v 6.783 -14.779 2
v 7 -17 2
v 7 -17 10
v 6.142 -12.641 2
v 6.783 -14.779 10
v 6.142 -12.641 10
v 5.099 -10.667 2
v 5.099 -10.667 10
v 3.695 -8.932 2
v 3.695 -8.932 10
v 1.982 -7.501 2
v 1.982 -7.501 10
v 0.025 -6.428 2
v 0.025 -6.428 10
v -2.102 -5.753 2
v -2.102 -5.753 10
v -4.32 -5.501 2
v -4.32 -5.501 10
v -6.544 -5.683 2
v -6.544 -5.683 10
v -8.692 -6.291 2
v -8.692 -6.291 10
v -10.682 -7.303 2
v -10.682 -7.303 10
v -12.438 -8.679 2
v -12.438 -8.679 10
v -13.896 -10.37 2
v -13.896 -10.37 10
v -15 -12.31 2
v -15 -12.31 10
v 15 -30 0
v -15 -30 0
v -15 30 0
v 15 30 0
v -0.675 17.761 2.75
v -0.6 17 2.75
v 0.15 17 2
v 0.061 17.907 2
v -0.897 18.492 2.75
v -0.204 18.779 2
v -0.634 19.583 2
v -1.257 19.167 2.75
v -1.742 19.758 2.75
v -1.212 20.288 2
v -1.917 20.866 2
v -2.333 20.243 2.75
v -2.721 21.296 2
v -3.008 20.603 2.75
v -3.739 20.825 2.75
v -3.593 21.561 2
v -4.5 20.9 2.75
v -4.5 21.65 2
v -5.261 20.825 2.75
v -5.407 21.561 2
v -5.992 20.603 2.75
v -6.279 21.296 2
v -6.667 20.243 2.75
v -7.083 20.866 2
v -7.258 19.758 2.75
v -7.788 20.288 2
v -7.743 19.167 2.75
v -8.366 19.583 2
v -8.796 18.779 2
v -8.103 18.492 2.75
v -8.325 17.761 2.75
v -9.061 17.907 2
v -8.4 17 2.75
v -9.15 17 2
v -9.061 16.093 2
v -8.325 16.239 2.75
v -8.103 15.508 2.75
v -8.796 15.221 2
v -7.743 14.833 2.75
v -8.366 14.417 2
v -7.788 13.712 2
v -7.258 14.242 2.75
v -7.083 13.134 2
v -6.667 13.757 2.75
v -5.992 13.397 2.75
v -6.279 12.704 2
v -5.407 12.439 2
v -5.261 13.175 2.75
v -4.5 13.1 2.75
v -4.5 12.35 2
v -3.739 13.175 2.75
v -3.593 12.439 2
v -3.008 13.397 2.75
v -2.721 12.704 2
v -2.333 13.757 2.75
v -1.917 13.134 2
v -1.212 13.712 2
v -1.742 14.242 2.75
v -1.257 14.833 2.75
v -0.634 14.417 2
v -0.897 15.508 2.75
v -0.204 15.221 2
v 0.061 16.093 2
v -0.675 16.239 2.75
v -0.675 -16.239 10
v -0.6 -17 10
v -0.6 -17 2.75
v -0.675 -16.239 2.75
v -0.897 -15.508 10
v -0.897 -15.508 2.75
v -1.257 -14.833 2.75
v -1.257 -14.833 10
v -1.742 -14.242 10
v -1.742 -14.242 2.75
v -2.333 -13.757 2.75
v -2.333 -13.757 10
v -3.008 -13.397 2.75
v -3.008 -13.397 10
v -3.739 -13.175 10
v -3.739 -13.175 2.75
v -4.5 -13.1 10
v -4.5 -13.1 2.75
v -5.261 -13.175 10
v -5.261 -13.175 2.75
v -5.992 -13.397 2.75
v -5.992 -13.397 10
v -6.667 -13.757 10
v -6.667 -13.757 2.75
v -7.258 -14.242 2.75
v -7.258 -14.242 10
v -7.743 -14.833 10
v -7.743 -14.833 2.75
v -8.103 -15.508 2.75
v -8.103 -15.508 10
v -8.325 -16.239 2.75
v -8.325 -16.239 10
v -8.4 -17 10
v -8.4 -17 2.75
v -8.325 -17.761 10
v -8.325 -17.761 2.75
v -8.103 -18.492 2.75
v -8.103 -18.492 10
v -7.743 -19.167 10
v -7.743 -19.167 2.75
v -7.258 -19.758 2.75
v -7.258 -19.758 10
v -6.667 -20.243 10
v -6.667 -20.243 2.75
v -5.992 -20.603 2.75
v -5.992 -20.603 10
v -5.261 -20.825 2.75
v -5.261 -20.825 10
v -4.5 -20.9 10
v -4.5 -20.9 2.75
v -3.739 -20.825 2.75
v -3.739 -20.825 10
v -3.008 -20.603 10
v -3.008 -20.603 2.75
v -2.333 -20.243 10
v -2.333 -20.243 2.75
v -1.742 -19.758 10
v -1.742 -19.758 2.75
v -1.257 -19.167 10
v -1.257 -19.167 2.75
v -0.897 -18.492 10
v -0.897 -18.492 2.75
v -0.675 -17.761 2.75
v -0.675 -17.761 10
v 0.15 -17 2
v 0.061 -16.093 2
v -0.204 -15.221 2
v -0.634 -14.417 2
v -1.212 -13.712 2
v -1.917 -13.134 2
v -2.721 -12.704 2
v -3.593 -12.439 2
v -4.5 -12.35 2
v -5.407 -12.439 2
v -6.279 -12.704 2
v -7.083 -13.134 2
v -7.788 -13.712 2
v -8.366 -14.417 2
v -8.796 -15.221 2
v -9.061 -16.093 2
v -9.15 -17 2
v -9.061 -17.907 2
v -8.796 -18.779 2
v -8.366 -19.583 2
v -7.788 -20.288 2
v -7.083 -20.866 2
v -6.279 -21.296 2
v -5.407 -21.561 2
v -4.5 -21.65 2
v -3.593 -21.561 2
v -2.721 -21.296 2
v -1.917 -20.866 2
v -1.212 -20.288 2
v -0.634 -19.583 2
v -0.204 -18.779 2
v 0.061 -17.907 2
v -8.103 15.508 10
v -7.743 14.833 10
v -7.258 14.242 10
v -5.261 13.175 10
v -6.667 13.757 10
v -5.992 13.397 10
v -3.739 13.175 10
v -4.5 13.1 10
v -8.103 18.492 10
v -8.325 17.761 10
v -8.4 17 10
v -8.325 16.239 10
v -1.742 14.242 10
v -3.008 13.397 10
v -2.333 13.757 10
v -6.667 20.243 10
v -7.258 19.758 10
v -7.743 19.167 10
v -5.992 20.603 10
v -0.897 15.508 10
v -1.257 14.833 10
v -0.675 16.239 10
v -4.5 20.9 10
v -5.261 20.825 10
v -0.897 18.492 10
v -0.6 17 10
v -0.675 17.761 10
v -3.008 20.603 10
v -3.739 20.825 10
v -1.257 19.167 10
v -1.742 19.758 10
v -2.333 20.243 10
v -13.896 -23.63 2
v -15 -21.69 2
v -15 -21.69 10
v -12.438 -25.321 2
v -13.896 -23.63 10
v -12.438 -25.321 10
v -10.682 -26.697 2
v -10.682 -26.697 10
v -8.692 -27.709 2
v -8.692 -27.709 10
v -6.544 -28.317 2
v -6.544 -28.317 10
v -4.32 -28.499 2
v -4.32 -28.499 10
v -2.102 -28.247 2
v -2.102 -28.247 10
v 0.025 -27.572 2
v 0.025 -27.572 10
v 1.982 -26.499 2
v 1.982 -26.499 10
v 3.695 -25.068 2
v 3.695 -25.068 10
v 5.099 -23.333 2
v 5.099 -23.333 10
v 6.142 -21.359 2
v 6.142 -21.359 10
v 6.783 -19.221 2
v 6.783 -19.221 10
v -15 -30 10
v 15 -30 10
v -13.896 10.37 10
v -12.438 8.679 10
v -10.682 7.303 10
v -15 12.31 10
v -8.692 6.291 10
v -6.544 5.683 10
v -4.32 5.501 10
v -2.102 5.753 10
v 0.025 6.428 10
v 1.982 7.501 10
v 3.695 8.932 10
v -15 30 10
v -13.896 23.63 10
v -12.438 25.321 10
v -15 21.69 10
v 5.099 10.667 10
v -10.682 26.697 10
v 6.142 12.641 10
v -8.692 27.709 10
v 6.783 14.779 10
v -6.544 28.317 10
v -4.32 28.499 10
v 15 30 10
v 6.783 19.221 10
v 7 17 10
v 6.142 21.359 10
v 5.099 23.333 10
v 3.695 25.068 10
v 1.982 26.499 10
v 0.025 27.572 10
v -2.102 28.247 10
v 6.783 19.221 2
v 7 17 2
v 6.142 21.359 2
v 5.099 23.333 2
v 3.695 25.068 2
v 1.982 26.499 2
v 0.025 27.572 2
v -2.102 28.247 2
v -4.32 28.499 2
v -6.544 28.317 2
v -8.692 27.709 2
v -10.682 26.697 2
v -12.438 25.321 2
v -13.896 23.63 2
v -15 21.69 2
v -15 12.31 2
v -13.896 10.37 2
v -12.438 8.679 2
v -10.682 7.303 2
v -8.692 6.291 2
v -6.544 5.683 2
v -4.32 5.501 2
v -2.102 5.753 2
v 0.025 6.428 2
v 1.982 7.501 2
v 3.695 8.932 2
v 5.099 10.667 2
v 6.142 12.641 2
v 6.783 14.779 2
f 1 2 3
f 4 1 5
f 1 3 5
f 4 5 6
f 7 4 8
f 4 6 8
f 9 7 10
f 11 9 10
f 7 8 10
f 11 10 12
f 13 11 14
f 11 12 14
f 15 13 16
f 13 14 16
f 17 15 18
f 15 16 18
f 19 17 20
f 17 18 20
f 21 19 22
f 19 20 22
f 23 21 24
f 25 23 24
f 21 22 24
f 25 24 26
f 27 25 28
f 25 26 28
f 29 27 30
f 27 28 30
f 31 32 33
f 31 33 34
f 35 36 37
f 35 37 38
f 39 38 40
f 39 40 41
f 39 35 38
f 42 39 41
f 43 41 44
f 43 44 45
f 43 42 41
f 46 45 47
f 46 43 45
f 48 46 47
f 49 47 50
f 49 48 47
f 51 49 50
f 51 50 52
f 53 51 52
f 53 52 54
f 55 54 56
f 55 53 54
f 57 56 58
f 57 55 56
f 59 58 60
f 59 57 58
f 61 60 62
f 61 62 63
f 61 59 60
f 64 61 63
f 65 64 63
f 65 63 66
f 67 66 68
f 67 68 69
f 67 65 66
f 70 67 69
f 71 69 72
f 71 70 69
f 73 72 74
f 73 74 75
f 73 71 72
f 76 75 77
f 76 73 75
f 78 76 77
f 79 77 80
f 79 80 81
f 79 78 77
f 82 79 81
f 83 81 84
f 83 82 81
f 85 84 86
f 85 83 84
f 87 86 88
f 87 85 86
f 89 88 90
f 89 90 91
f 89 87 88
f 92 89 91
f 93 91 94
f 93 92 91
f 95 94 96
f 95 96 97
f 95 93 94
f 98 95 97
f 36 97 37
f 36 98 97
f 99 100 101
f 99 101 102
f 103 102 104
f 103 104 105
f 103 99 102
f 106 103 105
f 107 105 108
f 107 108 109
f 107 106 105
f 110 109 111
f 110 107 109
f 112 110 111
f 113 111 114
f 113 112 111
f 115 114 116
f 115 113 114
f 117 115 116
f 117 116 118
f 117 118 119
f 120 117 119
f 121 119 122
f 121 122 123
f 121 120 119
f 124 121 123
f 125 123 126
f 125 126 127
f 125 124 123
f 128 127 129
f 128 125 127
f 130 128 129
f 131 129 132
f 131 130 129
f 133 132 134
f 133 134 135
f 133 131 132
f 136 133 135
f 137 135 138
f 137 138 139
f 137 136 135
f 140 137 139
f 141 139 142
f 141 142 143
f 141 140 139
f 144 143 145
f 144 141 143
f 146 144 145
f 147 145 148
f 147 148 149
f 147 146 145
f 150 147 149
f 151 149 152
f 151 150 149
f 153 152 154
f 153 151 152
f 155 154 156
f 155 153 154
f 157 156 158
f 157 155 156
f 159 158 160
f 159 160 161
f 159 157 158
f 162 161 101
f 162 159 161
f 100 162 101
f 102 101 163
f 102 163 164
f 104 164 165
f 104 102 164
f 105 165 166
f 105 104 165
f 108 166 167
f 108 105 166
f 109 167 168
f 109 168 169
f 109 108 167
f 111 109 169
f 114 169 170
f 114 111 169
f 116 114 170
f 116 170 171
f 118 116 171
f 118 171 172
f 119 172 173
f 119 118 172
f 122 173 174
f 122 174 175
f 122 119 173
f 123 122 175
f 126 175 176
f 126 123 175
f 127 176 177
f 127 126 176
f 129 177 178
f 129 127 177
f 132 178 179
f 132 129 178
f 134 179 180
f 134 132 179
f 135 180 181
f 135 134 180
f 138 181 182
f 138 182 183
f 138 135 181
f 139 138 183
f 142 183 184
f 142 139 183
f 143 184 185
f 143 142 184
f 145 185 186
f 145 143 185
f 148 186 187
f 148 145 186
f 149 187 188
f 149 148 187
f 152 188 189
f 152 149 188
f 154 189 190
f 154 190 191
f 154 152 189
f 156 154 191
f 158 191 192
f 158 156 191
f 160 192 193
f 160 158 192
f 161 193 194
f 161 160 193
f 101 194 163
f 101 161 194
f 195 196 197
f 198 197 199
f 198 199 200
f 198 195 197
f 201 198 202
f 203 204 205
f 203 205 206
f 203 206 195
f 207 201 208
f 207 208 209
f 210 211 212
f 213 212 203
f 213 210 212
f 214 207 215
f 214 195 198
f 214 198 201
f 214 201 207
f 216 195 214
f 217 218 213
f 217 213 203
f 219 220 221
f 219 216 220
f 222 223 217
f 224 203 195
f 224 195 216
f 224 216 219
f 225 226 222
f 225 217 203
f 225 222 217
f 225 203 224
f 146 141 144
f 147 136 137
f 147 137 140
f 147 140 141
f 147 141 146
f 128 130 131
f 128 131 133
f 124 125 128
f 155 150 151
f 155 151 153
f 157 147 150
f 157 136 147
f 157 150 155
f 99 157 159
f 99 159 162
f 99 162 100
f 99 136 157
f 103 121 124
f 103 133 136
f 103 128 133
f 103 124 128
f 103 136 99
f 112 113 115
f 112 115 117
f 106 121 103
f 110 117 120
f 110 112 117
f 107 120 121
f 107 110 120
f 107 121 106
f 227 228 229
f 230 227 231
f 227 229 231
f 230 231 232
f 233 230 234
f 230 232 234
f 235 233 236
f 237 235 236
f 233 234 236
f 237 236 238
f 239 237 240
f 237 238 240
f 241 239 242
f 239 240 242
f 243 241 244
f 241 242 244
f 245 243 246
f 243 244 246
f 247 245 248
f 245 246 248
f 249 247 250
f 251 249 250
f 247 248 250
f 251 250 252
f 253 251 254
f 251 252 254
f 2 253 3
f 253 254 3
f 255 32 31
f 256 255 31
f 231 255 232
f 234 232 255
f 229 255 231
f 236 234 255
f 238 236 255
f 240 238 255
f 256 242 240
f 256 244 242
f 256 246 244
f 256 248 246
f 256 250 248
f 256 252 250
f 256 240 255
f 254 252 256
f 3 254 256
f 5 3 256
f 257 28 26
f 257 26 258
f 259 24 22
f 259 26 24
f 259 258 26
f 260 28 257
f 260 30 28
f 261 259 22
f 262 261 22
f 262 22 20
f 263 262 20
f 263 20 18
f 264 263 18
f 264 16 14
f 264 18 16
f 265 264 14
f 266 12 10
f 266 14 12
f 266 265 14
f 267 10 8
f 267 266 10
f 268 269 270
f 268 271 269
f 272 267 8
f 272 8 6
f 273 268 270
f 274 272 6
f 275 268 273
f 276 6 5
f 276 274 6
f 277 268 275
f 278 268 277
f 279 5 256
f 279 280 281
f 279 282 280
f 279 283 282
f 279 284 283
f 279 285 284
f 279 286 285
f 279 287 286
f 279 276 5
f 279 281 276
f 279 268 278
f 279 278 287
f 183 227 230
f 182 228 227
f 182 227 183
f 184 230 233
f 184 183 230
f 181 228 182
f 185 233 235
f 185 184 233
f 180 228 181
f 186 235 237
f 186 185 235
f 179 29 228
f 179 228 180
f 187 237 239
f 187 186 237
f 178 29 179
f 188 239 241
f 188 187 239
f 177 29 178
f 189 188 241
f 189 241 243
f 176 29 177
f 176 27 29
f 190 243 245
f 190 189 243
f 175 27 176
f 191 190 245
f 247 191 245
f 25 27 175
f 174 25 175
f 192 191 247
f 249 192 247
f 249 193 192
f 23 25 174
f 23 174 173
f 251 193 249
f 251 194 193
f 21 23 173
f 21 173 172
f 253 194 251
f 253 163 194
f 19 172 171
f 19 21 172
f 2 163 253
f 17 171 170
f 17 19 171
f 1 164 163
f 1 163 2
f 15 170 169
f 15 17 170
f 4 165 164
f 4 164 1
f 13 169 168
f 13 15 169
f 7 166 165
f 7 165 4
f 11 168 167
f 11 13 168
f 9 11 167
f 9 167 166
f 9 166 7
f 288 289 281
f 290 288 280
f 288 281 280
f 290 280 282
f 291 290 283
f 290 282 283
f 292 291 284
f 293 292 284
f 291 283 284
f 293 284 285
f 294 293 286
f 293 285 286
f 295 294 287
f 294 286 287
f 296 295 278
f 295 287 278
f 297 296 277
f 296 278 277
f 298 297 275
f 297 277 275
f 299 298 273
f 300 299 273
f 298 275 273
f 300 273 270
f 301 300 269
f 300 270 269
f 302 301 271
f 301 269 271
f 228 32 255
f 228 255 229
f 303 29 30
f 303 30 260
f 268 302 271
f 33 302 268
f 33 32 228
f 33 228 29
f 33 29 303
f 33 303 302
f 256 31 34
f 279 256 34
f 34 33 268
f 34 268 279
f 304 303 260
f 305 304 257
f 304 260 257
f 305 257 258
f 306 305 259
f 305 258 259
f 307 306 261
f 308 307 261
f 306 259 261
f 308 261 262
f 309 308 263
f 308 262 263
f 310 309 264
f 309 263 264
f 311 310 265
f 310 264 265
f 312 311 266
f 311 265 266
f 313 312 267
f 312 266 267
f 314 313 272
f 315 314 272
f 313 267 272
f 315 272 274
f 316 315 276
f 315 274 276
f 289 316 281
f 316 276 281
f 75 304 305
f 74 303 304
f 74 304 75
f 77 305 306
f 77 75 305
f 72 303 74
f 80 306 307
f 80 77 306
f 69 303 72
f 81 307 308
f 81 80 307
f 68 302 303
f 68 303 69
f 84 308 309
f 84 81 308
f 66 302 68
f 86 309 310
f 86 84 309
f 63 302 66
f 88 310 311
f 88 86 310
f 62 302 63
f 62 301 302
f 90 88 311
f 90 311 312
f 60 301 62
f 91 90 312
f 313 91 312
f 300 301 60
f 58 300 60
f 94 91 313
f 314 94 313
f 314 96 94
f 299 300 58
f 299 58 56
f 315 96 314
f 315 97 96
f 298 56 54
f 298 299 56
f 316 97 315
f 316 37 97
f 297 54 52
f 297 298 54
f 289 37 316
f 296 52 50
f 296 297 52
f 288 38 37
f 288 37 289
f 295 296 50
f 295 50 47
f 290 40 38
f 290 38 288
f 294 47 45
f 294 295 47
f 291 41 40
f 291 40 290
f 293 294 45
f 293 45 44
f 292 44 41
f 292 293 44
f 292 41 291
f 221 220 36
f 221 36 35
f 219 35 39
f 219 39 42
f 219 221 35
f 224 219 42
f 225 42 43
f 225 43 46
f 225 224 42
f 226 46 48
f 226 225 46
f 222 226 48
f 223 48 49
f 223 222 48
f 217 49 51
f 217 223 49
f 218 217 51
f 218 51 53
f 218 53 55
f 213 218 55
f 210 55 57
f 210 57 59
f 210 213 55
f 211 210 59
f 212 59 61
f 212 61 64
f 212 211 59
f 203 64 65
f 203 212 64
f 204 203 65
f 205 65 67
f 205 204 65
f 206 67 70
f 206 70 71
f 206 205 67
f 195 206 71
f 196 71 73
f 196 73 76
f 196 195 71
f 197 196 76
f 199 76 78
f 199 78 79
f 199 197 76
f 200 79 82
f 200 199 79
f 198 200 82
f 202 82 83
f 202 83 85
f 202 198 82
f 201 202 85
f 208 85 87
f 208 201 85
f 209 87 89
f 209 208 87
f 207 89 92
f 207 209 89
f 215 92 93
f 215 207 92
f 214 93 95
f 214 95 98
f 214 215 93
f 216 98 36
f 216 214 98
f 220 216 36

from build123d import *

# Parameters (mm, degrees)
F0_W     = 30
F0_H     = 60
F1_DEPTH = 10
F2_R     = 3.9
F3_DEPTH = 8
F4_SIZE  = 0.75


with BuildPart() as f1:
    # F0 (on Top) → F1 (new body)
    with BuildSketch(Plane.XY):
        Rectangle(F0_W, F0_H)
    extrude(amount=F1_DEPTH)

    # F2 (on face) → F3 (cut)
    with BuildSketch(Plane.XY.offset(10)):
        with BuildLine():
            ThreePointArc((-15, 12.309584), (-2.102084, 5.752778), (7, 17))
            ThreePointArc((7, 17), (-2.102084, 28.247222), (-15, 21.690416))
            Line((-15, 21.690416), (-15, 12.309584))
        make_face()
        with Locations((-4.5, 17)):
            Circle(F2_R, mode=Mode.SUBTRACT)
        with BuildLine():
            ThreePointArc((7, -17), (-2.102084, -5.752778), (-15, -12.309584))
            Line((-15, -12.309584), (-15, -21.690416))
            ThreePointArc((-15, -21.690416), (-2.102084, -28.247222), (7, -17))
        make_face()
        with Locations((-4.5, -17)):
            Circle(F2_R, mode=Mode.SUBTRACT)
    extrude(amount=-F3_DEPTH, mode=Mode.SUBTRACT)

    # F4
    f4_edges = [f1.edges().sort_by_distance(p)[0] for p in [
        (-8.4, 17, 2),
        (-8.4, -17, 2),
    ]]
    chamfer(f4_edges, length=F4_SIZE)


solid = f1.part
